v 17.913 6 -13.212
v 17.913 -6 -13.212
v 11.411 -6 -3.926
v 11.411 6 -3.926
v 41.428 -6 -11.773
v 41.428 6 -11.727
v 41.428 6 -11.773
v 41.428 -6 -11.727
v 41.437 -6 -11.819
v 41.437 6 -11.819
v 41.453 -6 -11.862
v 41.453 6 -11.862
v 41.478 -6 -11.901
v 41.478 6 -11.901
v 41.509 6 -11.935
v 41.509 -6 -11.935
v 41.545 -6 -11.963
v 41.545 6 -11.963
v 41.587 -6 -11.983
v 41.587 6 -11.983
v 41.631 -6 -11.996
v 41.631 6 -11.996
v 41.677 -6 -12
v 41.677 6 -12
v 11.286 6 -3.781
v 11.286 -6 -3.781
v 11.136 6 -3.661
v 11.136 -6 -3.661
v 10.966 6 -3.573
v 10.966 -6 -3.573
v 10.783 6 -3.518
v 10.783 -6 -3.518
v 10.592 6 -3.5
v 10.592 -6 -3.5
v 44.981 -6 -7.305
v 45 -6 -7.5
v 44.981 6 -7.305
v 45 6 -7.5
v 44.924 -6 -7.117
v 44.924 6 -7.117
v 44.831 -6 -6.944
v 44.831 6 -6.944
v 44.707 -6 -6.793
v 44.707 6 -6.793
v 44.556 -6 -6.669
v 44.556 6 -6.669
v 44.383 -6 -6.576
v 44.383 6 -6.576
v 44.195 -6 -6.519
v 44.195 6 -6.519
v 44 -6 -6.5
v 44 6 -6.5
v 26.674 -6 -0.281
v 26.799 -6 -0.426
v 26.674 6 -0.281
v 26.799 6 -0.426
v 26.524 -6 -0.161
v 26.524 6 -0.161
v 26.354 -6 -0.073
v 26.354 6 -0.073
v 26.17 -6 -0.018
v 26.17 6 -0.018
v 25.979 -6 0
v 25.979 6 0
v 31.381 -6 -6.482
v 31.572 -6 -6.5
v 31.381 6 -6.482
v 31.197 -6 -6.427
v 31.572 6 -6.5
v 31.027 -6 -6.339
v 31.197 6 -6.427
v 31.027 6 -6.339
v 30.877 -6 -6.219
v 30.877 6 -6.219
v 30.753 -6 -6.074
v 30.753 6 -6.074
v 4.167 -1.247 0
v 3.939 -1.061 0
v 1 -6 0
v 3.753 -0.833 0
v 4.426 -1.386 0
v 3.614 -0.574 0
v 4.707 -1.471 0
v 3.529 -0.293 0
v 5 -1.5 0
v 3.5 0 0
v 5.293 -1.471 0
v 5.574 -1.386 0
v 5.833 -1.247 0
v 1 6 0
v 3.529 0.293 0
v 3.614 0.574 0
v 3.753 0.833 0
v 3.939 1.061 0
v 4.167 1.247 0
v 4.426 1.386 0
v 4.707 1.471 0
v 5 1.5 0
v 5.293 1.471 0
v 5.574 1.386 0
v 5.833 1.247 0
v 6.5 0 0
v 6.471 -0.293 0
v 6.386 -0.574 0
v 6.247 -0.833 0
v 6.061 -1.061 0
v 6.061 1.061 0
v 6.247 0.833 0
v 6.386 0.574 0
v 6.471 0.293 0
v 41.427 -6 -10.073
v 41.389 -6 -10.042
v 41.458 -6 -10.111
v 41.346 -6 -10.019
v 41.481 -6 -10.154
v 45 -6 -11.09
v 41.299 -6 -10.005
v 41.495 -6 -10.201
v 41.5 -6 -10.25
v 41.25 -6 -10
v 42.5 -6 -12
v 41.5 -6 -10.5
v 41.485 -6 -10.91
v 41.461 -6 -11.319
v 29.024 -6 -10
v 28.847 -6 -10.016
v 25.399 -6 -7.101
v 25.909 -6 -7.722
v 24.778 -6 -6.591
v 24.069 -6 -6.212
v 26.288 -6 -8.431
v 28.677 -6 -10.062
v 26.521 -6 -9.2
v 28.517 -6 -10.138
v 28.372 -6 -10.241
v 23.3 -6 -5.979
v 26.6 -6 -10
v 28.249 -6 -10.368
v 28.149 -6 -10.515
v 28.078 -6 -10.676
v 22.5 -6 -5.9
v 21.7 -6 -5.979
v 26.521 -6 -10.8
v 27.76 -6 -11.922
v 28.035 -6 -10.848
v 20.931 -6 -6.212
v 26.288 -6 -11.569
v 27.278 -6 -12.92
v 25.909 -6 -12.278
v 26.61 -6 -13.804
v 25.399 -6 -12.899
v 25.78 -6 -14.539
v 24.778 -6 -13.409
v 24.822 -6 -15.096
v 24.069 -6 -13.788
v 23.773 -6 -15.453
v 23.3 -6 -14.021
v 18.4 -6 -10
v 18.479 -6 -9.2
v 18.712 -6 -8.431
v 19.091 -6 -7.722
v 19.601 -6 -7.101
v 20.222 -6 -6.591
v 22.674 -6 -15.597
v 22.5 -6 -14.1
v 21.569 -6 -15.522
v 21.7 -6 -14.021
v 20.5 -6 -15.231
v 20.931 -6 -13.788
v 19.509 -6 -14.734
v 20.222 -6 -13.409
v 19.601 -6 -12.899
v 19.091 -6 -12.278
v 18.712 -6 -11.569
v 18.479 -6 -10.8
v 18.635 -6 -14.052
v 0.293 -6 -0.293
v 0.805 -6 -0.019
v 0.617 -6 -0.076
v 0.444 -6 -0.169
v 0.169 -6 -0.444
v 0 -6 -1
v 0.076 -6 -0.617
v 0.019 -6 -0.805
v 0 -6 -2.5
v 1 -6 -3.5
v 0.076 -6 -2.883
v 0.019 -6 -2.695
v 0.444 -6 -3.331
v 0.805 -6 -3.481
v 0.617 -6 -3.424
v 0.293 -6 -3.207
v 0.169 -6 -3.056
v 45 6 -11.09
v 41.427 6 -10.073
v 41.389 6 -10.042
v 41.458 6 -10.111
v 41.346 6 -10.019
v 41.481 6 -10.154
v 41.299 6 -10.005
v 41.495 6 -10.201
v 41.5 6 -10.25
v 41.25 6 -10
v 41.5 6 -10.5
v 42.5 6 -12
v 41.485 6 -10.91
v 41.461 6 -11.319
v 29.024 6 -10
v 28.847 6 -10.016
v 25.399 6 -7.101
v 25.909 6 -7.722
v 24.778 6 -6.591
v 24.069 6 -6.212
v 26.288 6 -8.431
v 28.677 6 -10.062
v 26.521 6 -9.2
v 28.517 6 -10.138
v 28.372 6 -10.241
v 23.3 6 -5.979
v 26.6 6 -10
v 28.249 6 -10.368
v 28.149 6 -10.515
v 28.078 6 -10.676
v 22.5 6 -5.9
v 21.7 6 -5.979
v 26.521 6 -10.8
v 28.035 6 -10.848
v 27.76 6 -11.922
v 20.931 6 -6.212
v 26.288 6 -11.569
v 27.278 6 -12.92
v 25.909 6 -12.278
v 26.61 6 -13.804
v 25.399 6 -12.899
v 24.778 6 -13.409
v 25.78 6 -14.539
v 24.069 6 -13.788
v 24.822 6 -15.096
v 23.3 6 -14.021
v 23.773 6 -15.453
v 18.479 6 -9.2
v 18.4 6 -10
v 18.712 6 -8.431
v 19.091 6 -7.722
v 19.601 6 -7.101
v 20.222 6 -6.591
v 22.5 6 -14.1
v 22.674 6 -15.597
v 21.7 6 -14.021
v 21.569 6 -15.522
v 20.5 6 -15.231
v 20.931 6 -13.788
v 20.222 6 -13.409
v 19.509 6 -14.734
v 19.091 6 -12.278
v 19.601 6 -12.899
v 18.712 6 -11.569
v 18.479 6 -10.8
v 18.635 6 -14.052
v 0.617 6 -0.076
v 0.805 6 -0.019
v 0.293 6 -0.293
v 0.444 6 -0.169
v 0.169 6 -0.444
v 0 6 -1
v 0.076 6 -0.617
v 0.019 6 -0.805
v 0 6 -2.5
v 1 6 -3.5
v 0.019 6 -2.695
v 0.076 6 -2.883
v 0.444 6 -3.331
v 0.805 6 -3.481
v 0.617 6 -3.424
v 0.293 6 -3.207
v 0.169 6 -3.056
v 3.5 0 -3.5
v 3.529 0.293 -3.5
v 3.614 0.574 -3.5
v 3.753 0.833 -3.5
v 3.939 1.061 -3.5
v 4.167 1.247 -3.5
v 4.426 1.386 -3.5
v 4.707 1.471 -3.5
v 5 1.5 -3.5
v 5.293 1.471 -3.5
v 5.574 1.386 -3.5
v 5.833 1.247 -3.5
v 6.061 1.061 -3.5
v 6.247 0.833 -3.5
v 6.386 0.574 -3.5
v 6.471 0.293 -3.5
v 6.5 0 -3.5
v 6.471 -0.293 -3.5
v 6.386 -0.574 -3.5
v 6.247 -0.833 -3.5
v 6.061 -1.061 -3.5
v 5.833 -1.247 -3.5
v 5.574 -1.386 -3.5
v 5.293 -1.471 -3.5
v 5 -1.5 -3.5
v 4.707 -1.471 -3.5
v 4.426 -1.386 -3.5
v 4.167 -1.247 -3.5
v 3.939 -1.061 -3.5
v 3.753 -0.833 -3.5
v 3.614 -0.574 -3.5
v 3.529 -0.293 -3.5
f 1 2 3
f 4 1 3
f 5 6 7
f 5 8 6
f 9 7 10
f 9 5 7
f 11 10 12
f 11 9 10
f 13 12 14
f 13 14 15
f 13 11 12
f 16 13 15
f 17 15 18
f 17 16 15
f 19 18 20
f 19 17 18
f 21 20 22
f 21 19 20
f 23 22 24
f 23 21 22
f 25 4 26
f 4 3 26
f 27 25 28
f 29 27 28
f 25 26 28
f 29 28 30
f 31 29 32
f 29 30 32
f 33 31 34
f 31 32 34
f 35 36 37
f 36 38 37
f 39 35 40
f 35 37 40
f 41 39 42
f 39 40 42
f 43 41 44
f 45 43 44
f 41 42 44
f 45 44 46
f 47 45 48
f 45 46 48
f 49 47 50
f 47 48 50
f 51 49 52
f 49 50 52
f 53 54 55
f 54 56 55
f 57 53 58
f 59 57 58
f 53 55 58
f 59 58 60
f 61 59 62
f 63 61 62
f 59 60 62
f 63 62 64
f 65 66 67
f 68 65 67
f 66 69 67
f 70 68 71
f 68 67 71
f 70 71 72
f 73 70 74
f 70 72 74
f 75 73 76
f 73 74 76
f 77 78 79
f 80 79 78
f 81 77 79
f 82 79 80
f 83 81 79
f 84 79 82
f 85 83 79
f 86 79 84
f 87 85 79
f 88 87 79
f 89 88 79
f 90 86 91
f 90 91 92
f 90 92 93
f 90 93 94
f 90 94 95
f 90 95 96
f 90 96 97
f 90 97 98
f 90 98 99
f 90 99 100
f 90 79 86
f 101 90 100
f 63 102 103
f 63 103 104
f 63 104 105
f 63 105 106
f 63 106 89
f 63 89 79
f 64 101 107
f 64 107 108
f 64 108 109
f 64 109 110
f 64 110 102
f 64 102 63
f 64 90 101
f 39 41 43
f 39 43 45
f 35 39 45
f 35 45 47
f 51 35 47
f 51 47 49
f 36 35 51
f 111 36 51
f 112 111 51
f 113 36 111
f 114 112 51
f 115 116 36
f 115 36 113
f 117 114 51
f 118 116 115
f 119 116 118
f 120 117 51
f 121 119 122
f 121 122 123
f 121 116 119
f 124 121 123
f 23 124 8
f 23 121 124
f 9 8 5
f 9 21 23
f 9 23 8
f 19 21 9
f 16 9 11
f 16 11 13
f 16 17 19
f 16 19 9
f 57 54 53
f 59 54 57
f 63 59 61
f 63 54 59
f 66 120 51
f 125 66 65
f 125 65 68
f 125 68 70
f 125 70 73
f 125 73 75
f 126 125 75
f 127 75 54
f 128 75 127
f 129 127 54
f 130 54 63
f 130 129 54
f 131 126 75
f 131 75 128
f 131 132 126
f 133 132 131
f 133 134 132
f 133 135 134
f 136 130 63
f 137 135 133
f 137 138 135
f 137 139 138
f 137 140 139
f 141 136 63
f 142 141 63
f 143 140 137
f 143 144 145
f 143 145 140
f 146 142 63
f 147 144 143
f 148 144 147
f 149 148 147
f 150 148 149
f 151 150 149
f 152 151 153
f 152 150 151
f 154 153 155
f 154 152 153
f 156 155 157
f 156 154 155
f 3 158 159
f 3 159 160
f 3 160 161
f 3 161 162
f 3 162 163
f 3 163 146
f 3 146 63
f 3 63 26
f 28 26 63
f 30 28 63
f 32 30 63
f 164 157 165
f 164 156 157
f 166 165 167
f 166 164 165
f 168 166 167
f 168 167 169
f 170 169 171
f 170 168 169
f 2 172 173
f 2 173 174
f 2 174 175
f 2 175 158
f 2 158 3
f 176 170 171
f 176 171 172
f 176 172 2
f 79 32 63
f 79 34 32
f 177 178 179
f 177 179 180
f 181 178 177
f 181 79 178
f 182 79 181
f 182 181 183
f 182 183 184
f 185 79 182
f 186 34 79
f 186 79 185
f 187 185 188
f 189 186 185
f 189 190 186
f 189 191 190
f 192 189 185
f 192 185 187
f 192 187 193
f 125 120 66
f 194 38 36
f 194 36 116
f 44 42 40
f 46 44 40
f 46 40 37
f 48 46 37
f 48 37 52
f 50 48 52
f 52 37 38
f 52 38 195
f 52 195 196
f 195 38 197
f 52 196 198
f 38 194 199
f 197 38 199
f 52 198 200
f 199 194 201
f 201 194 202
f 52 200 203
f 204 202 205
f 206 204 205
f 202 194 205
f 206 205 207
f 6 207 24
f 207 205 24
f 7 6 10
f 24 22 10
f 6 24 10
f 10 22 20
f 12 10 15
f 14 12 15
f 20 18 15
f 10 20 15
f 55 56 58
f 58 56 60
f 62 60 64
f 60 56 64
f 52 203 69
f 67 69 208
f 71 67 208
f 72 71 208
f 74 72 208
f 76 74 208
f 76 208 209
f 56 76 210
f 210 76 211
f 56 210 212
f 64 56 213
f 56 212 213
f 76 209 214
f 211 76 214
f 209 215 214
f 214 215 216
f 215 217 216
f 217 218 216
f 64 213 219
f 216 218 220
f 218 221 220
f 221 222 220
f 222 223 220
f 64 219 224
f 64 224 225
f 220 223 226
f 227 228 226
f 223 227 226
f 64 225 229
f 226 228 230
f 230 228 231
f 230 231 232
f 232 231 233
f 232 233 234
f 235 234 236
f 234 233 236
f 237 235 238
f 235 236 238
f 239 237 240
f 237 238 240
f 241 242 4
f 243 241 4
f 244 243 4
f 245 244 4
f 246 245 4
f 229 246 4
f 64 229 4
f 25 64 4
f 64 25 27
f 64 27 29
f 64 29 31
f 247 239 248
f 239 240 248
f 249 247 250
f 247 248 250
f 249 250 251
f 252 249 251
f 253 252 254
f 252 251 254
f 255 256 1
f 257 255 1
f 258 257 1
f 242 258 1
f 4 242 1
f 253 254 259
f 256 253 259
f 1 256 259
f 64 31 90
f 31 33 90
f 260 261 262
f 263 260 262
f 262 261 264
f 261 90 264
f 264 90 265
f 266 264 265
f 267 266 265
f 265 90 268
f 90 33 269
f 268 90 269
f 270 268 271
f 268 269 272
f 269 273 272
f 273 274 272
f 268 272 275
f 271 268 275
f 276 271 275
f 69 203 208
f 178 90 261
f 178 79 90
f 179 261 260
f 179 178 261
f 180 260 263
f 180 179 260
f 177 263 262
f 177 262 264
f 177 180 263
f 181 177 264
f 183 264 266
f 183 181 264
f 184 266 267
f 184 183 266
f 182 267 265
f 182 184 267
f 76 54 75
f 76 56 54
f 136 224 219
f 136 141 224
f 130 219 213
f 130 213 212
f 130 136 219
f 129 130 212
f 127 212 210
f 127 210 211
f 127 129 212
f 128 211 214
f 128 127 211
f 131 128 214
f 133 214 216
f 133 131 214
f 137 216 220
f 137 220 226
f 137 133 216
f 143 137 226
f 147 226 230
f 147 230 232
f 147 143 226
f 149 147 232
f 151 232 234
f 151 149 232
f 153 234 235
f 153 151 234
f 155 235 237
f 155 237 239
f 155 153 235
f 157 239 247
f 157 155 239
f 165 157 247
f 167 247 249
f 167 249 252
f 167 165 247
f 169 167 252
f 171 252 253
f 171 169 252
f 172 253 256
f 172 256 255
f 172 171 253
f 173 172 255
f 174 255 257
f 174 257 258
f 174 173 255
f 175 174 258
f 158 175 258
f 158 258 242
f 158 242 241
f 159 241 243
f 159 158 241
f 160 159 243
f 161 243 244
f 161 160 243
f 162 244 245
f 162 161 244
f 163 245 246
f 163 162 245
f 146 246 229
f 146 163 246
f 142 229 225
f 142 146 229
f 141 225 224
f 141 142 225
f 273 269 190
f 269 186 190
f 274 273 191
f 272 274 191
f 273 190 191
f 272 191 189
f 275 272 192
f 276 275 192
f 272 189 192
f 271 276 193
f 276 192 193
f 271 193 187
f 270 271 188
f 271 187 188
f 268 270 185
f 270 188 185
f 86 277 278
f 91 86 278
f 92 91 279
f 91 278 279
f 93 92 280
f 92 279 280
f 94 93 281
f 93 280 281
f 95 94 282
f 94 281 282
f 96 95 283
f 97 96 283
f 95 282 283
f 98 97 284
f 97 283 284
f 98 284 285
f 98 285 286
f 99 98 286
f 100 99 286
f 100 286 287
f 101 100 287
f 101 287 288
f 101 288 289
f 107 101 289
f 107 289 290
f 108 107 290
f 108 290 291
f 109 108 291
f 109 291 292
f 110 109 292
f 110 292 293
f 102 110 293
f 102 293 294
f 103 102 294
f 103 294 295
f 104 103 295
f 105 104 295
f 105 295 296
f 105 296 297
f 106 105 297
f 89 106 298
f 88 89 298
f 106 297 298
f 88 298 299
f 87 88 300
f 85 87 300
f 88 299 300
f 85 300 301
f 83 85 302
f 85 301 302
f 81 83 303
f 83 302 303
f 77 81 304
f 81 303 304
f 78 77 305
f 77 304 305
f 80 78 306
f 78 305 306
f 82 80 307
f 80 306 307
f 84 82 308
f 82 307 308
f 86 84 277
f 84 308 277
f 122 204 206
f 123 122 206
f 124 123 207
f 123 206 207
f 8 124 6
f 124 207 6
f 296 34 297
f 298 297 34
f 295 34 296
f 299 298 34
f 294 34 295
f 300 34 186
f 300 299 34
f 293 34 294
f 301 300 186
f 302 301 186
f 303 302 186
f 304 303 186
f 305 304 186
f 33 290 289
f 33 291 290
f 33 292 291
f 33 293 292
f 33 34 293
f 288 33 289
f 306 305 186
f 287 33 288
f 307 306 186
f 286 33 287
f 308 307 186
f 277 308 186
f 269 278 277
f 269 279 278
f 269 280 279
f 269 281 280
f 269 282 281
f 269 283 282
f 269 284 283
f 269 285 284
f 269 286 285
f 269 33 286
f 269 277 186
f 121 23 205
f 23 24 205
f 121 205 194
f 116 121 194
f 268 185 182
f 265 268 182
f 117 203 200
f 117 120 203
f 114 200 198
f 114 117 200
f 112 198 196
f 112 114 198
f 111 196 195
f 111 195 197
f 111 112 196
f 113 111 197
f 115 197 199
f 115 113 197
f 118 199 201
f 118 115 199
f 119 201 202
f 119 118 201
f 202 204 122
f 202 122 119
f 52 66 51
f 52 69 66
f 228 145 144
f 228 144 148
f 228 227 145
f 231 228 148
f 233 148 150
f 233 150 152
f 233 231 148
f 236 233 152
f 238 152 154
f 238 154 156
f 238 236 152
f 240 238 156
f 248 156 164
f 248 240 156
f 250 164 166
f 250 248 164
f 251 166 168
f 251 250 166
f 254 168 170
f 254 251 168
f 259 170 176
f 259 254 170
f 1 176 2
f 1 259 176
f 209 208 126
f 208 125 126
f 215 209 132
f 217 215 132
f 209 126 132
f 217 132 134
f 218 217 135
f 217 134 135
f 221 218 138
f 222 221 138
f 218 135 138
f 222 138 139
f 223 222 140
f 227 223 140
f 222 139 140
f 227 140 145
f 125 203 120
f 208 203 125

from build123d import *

# Parameters (mm, degrees)
SKETCH1_R             = 4.1
BOSS_EXTRUDE1_DEPTH   = 6
F_3_0MM_DOWEL_HOLE1_D = 3
BOSS_EXTRUDE3_DEPTH   = 12
FILLET1_R             = 0.25
FILLET3_R             = 1
CUT_EXTRUDE3_DEPTH    = 12


with BuildPart() as part:
    # Sketch1 → Boss-Extrude1 (new, symmetric)
    with BuildSketch(Plane(origin=(0, 0, 0), x_dir=(1, 0, 0), z_dir=(0, 1, 0))):
        with BuildLine():
            Line((0, 0), (26.5, 0))
            Line((26.5, 0), (31.051348998, 6.5))
            Line((31.051348998, 6.5), (45, 6.5))
            Line((45, 6.5), (45, 12))
            Line((45, 12), (41.5, 12))
            Line((41.5, 12), (41.5, 10))
            Line((41.5, 10), (28.1, 10))
            ThreePointArc((28.1, 10), (24.183952477, 15.340814924), (17.912748552, 13.212028044))
            Line((17.912748552, 13.212028044), (11.112313305, 3.5))
            Line((11.112313305, 3.5), (0, 3.5))
            Line((0, 3.5), (0, 0))
        make_face()
        with Locations(Location((22.5, 10, 0), (0, 0, 270))):
            Circle(SKETCH1_R, mode=Mode.SUBTRACT)
    extrude(amount=BOSS_EXTRUDE1_DEPTH, both=True)

    # Ø3.0mm Dowel Hole1 (through all)
    with Locations(Plane.XY):
        with Locations((5, 0)):
            Hole(F_3_0MM_DOWEL_HOLE1_D / 2)

    # Sketch5 → Boss-Extrude3 (add)
    with BuildSketch(Plane(origin=(0, 6, 0), x_dir=(1, 0, 0), z_dir=(0, 1, 0))):
        with BuildLine():
            Line((41.5, 12), (41.5, 10.5))
            ThreePointArc((41.5, 10.5), (41.465364553, 11.250978566), (41.401058171, 12))
            Line((41.401058171, 12), (41.5, 12))
        make_face()
    extrude(amount=-BOSS_EXTRUDE3_DEPTH)

    # Fillet1
    fillet1_edges = [part.edges().sort_by_distance(p)[0] for p in [
        (41.5, 0, -10),
        (41.401058171, 0, -12),
    ]]
    fillet(fillet1_edges, radius=FILLET1_R)

    # Fillet3
    fillet3_edges = [part.edges().sort_by_distance(p)[0] for p in [
        (31.051348998, 0, -6.5),
        (26.5, 0, 0),
        (0, 0, 0),
        (0, 0, -3.5),
        (11.112313305, 0, -3.5),
        (28.1, 0, -10),
        (45, 0, -6.5),
    ]]
    fillet(fillet3_edges, radius=FILLET3_R)

    # Sketch8 → Cut-Extrude3 (cut)
    with BuildSketch(Plane(origin=(0, 6, 0), x_dir=(1, 0, 0), z_dir=(0, 1, 0))):
        Polygon((45, 12), (42.5, 12), (45, 11.090074414), align=None)
    extrude(amount=-CUT_EXTRUDE3_DEPTH, mode=Mode.SUBTRACT)


solid = part.part
